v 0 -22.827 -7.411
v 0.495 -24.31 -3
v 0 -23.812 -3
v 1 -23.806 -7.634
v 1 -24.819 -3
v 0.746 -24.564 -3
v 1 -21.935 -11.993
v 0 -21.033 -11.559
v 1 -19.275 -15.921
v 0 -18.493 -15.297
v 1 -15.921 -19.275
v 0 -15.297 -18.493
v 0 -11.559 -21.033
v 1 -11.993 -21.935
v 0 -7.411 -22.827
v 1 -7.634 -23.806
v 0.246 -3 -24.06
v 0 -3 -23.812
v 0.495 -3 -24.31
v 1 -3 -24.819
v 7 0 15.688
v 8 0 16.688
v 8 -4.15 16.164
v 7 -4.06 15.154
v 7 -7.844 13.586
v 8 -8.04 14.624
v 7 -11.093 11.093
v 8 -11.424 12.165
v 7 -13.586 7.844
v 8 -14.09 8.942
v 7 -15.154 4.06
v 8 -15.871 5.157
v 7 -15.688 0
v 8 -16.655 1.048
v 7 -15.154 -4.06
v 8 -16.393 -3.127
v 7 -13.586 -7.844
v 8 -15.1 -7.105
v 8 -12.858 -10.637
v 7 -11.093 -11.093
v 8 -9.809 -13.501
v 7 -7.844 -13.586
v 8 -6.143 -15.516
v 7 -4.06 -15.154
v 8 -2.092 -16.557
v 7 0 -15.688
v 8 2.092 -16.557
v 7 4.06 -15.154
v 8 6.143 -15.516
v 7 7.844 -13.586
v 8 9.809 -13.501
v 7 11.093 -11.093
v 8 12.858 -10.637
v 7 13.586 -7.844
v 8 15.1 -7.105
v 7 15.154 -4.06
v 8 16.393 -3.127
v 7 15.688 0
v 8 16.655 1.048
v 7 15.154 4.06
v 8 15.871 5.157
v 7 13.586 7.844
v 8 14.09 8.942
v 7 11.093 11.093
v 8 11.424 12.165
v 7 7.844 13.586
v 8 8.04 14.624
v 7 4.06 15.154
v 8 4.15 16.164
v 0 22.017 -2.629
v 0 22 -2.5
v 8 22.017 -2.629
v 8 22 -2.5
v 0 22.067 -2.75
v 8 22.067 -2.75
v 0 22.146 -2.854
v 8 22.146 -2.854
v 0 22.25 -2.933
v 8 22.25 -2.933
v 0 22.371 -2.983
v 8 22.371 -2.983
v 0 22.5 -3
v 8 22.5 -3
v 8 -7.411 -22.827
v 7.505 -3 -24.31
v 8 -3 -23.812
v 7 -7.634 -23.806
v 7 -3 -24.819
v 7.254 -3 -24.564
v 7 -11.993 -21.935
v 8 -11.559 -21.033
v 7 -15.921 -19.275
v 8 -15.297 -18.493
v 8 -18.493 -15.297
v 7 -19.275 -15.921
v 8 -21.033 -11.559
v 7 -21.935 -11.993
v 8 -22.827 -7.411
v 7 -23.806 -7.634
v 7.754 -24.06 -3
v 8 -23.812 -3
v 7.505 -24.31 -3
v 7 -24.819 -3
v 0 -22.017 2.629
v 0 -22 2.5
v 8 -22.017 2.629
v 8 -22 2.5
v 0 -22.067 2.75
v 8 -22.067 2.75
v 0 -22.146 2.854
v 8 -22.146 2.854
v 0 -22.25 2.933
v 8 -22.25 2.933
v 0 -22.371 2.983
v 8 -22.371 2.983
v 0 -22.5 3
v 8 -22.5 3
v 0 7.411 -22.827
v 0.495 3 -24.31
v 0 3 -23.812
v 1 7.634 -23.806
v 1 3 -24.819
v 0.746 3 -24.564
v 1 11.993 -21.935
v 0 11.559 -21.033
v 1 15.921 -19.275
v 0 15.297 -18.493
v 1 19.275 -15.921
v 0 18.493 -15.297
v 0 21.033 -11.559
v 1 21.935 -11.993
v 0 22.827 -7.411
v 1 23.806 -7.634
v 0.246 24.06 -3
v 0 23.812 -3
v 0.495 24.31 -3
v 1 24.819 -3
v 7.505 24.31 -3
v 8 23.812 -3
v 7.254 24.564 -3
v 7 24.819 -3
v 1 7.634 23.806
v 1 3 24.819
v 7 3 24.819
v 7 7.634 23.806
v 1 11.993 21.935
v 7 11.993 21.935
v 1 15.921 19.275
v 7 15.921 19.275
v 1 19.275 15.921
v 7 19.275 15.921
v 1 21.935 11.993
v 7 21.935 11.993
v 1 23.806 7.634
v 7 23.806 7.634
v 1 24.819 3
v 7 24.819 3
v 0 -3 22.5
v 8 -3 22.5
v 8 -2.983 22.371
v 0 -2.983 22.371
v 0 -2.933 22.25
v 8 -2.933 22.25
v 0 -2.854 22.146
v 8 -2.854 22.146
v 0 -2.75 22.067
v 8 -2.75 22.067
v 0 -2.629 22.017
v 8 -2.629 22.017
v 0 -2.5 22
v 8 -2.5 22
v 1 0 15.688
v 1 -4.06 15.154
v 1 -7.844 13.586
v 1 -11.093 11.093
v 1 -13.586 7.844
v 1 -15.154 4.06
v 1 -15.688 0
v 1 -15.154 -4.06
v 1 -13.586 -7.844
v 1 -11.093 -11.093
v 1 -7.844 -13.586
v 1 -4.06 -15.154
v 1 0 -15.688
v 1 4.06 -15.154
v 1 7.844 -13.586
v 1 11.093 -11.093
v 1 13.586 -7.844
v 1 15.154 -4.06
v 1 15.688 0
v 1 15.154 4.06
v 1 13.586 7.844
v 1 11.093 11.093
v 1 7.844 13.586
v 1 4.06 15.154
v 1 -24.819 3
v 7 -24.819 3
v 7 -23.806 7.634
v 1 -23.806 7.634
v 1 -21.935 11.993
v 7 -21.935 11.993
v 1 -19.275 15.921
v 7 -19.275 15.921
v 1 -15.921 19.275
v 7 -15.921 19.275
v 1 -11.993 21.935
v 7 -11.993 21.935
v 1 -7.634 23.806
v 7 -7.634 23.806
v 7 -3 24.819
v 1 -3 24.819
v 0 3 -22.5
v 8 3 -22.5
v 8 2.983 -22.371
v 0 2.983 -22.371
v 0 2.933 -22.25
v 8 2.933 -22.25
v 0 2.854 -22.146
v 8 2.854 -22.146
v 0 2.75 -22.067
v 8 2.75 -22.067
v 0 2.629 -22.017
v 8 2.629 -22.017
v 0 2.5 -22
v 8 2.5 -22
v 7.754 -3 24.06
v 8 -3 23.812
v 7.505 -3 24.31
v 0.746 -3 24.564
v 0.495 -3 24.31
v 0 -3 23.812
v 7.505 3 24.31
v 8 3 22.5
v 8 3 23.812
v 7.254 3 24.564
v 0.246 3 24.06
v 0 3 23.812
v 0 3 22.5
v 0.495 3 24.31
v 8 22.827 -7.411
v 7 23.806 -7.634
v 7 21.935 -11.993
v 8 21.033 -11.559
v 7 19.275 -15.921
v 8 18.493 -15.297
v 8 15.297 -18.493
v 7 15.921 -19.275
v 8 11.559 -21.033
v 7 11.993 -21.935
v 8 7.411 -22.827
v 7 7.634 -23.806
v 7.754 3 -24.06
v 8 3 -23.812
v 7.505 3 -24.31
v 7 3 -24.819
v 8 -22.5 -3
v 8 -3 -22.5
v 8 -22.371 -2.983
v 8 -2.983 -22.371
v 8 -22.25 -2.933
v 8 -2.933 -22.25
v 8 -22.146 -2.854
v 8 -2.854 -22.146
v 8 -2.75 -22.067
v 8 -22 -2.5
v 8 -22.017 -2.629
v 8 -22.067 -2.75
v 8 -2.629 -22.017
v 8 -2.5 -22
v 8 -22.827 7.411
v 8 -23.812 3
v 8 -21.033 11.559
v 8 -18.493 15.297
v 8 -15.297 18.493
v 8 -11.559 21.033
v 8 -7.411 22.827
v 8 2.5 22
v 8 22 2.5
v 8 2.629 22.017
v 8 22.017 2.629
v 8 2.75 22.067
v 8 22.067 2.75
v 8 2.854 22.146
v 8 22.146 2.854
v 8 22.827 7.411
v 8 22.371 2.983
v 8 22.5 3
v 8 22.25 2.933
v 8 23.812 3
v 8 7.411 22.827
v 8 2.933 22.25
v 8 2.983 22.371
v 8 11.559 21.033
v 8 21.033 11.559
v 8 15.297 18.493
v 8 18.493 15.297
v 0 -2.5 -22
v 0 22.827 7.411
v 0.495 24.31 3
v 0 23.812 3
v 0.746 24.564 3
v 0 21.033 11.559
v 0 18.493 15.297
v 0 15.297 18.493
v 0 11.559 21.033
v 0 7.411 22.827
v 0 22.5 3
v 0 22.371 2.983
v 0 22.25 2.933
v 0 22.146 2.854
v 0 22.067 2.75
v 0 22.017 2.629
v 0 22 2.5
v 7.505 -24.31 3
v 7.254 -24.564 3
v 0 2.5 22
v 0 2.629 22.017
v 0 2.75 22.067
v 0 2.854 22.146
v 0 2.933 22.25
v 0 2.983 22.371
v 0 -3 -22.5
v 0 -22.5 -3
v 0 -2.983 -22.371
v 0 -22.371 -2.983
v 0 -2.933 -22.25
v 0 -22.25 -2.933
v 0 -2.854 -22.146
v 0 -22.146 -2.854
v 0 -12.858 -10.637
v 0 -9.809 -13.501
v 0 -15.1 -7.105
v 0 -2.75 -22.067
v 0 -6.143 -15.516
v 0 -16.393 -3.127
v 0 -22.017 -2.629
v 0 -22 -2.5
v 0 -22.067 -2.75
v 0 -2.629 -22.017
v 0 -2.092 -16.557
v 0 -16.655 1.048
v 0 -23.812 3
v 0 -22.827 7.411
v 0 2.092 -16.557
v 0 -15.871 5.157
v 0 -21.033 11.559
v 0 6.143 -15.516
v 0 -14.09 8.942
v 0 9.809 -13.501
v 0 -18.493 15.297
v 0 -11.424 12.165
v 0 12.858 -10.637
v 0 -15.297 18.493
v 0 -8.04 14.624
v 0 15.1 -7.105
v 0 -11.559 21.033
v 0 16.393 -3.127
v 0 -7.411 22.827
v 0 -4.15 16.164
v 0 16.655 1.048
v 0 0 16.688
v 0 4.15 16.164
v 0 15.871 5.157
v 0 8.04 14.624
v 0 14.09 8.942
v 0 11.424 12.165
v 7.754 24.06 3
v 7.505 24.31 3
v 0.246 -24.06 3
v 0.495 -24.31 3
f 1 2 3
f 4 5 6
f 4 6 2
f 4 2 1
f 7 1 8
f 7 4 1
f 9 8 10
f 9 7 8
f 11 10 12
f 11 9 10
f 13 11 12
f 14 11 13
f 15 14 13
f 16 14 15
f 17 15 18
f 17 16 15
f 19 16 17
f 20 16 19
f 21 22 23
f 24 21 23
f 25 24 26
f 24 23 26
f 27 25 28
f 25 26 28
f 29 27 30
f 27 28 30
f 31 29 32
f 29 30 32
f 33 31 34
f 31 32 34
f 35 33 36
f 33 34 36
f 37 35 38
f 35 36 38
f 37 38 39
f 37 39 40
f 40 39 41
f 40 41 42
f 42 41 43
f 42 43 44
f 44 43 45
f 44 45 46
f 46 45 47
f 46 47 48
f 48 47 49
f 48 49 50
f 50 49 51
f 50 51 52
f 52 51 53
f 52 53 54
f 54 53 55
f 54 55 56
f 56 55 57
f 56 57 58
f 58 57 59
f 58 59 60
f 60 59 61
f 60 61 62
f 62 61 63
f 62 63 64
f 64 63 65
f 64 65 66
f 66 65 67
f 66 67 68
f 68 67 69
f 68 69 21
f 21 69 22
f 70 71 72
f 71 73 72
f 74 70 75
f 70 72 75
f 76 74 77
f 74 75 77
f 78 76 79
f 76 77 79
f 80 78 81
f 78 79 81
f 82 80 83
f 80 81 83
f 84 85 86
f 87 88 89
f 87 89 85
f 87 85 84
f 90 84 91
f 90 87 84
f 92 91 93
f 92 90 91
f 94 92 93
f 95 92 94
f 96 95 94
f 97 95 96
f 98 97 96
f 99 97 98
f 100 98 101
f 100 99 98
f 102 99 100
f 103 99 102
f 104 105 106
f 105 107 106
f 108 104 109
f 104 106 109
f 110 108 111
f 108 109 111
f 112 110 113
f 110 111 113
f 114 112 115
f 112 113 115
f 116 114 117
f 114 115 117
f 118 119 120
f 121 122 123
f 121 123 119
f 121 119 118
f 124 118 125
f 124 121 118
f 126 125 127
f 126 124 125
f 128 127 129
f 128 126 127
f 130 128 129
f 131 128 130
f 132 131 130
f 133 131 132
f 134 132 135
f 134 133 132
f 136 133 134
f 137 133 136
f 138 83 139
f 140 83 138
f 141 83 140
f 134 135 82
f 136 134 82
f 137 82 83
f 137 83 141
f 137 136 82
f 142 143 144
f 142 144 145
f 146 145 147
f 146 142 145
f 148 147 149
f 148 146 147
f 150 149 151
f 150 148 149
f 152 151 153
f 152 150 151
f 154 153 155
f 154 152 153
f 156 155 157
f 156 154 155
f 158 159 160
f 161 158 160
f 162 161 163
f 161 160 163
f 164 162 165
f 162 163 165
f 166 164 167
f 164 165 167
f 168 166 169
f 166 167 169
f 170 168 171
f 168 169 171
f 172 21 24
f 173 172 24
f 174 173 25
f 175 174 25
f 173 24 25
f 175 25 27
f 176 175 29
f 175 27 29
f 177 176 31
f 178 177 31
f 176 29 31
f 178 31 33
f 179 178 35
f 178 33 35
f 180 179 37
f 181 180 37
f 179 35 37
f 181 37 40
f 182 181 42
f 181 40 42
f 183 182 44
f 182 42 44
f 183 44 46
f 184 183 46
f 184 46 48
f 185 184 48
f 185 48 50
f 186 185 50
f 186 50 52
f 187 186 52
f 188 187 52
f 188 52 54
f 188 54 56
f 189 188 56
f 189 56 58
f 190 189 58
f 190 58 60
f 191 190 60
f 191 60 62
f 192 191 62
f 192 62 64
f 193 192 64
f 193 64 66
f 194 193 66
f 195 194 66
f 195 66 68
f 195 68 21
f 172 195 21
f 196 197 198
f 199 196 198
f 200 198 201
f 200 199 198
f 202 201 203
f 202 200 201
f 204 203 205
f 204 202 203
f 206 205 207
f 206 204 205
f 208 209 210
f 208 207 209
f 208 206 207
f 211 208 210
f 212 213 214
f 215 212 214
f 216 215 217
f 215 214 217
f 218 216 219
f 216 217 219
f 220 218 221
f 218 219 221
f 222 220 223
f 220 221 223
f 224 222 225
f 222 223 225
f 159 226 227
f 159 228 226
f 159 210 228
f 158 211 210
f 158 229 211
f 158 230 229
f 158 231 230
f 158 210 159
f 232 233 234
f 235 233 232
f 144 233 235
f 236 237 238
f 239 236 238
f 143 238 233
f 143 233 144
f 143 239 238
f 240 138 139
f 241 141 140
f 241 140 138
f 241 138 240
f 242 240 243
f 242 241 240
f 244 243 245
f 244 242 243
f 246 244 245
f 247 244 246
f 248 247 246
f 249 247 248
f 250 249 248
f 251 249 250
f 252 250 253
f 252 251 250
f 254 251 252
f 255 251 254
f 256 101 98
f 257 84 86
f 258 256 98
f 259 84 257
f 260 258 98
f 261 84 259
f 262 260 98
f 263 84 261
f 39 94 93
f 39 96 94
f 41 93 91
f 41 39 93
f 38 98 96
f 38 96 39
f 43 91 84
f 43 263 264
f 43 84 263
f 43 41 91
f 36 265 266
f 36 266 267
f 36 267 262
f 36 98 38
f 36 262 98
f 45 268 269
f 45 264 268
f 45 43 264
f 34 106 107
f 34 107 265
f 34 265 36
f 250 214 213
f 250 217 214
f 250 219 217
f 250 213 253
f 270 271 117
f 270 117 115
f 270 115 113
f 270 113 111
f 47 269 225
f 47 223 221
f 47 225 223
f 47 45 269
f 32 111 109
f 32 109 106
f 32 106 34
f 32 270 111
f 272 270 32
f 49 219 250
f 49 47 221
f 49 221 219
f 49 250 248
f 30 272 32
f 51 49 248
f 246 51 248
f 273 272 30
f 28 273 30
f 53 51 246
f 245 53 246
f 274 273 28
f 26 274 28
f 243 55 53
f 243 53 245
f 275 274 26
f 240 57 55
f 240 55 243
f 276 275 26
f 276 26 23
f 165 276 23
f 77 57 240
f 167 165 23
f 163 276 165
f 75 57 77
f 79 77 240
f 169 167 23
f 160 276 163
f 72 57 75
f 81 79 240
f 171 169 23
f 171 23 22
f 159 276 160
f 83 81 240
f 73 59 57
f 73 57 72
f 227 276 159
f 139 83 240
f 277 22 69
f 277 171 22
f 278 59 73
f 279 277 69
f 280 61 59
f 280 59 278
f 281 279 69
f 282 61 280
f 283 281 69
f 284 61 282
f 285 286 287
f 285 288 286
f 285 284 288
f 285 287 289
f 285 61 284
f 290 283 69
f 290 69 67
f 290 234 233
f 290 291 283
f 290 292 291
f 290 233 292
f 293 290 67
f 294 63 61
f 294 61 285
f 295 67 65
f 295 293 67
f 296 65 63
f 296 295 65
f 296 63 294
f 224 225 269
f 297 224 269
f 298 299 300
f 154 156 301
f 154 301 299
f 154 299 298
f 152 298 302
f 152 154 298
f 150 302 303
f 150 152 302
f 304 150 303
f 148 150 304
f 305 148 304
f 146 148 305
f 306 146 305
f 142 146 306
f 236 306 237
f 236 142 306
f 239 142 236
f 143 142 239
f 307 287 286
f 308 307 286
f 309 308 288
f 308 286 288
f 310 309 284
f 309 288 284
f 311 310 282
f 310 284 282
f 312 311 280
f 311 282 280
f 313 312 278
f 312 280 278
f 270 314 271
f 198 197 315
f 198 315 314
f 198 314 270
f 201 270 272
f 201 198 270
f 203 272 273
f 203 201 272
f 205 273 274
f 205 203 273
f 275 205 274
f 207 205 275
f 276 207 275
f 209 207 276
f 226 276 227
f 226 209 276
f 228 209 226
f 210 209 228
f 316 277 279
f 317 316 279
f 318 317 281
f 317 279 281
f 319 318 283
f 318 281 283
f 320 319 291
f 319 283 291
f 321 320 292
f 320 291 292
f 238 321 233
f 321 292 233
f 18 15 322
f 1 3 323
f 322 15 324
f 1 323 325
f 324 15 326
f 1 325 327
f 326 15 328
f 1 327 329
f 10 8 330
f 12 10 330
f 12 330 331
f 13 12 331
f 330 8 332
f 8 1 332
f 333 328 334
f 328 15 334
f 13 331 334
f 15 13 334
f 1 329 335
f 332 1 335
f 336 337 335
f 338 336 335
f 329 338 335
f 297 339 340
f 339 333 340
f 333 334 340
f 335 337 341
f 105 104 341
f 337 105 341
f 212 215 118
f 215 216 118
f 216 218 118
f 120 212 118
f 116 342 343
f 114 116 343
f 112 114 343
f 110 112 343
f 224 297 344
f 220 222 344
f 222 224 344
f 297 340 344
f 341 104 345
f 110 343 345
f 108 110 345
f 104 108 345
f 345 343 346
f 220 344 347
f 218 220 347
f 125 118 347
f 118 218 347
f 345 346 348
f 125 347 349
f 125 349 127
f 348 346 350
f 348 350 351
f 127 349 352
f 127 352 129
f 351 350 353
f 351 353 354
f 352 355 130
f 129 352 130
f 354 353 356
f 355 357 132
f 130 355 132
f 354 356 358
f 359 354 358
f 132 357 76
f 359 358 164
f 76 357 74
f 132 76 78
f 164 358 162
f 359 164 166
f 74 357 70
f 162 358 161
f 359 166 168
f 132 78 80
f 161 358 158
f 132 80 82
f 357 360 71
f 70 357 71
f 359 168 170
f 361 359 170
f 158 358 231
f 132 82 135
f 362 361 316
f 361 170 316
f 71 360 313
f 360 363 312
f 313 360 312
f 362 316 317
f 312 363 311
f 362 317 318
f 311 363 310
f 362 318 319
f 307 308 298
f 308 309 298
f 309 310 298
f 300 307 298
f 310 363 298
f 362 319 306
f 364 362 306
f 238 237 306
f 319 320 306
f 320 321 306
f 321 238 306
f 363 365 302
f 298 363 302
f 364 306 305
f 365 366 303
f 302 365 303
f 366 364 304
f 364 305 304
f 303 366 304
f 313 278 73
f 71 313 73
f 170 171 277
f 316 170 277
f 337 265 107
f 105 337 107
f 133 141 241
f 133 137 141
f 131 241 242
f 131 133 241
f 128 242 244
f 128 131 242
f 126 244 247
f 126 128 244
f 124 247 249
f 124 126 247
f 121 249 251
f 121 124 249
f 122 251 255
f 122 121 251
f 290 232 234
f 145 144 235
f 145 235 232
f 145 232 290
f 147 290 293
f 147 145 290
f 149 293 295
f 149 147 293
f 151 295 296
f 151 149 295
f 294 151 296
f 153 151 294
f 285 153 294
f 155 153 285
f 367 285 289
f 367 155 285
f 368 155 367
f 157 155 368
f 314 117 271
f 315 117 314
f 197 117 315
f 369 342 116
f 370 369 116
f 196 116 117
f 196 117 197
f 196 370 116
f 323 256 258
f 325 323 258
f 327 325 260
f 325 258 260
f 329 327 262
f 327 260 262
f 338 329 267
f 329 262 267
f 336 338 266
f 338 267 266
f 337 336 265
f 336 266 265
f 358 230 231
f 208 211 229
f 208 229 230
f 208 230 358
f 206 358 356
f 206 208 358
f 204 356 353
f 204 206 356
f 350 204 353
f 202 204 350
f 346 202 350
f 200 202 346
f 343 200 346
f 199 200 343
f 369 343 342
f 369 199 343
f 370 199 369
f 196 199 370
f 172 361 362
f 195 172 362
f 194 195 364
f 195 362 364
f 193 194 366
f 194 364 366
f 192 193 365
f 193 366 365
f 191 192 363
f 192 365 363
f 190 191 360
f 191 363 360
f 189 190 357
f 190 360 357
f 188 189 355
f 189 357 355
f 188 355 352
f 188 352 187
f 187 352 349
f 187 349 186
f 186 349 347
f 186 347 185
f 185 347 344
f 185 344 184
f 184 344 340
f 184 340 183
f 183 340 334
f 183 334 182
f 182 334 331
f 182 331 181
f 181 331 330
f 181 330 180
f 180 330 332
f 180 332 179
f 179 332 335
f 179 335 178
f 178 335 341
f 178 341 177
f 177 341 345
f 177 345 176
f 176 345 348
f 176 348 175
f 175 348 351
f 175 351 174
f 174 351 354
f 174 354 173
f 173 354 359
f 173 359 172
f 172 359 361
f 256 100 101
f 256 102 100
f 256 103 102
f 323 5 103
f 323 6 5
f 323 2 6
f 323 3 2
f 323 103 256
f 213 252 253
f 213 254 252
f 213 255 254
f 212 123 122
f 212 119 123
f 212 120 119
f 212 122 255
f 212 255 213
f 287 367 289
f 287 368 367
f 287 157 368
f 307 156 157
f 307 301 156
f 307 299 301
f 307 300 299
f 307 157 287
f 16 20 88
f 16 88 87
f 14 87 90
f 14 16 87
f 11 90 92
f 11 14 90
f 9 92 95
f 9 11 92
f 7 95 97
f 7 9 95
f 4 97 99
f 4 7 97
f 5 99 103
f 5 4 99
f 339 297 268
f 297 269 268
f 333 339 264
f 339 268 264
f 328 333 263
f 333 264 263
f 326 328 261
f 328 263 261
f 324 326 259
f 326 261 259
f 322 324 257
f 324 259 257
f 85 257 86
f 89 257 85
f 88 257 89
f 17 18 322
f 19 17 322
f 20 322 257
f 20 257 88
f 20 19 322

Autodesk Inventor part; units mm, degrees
ref_plane "YZ Plane" through (0, 0, 0) normal (1, 0, 0) x (0, 1, 0)
ref_plane "XZ Plane" through (0, 0, 0) normal (0, 1, 0) x (-1, 0, 0)
ref_plane "XY Plane" through (0, 0, 0) normal (0, 0, 1) x (1, 0, 0)
sketch "Boceto1" plane through (0, 0, 0) normal (1, 0, 0) x (0, 1, 0)
  circle A0 centre (0, 0) radius 25
  dimension "d9" = 50
extrude "Extrusión1" add sketch "Boceto1" along normal blind 8
sketch "Boceto2" plane through (0, 0, 0) normal (-1, 0, 0) x (0, 0, 1)
  circle A0 centre (0, 0) radius 25 projected
hole "Agujero1" at (0, 0, 0) direction (1, 0, 0) diameter 31.3762 end through all thread size "M33x1.5" class "6H" standard "ISO Metric profile"
chamfer "Chaflán1" distance 1 angle 45 4 edges at (0, -25, 0) (8, -25, 0) (0, 0, -15.6881) (8, 0, -15.6881)
sketch "Boceto3" plane through (0, 0, 0) normal (-1, 0, 0) x (0, 0, 1)
  circle A0 centre (0, 0) radius 24 projected
  circle A1 centre (0, 0) radius 25 projected
  line L0 (3, -25) -> (-3, -25)
  line L1 (-3, -25) -> (-3, -22)
  line L2 (-3, -22) -> (3, -22)
  line L3 (3, -22) -> (3, -25)
  point P0 (0, -22)
  dimension "d13" = 6
  dimension "d14" = 3
extrude "Extrusión2" cut sketch "Boceto3" against normal through all contours L1 L2 L3 A0 | A0 L3 A1 L1 | A1 L0 L1 | L3 L0 A1 picked at (-0.3341, -22.6597) picked at (0, -24.3194)
fillet "Empalme1" radius 0.5 2 edges at (4, -22, -3) (4, -22, 3)
pattern_circular "Patrón circular1" count 4 over 360 about axis through (71.1618, 0, 0) along (-1, 0, 0) of "Extrusión2", "Empalme1"
properties part number "retenedor_plato"
